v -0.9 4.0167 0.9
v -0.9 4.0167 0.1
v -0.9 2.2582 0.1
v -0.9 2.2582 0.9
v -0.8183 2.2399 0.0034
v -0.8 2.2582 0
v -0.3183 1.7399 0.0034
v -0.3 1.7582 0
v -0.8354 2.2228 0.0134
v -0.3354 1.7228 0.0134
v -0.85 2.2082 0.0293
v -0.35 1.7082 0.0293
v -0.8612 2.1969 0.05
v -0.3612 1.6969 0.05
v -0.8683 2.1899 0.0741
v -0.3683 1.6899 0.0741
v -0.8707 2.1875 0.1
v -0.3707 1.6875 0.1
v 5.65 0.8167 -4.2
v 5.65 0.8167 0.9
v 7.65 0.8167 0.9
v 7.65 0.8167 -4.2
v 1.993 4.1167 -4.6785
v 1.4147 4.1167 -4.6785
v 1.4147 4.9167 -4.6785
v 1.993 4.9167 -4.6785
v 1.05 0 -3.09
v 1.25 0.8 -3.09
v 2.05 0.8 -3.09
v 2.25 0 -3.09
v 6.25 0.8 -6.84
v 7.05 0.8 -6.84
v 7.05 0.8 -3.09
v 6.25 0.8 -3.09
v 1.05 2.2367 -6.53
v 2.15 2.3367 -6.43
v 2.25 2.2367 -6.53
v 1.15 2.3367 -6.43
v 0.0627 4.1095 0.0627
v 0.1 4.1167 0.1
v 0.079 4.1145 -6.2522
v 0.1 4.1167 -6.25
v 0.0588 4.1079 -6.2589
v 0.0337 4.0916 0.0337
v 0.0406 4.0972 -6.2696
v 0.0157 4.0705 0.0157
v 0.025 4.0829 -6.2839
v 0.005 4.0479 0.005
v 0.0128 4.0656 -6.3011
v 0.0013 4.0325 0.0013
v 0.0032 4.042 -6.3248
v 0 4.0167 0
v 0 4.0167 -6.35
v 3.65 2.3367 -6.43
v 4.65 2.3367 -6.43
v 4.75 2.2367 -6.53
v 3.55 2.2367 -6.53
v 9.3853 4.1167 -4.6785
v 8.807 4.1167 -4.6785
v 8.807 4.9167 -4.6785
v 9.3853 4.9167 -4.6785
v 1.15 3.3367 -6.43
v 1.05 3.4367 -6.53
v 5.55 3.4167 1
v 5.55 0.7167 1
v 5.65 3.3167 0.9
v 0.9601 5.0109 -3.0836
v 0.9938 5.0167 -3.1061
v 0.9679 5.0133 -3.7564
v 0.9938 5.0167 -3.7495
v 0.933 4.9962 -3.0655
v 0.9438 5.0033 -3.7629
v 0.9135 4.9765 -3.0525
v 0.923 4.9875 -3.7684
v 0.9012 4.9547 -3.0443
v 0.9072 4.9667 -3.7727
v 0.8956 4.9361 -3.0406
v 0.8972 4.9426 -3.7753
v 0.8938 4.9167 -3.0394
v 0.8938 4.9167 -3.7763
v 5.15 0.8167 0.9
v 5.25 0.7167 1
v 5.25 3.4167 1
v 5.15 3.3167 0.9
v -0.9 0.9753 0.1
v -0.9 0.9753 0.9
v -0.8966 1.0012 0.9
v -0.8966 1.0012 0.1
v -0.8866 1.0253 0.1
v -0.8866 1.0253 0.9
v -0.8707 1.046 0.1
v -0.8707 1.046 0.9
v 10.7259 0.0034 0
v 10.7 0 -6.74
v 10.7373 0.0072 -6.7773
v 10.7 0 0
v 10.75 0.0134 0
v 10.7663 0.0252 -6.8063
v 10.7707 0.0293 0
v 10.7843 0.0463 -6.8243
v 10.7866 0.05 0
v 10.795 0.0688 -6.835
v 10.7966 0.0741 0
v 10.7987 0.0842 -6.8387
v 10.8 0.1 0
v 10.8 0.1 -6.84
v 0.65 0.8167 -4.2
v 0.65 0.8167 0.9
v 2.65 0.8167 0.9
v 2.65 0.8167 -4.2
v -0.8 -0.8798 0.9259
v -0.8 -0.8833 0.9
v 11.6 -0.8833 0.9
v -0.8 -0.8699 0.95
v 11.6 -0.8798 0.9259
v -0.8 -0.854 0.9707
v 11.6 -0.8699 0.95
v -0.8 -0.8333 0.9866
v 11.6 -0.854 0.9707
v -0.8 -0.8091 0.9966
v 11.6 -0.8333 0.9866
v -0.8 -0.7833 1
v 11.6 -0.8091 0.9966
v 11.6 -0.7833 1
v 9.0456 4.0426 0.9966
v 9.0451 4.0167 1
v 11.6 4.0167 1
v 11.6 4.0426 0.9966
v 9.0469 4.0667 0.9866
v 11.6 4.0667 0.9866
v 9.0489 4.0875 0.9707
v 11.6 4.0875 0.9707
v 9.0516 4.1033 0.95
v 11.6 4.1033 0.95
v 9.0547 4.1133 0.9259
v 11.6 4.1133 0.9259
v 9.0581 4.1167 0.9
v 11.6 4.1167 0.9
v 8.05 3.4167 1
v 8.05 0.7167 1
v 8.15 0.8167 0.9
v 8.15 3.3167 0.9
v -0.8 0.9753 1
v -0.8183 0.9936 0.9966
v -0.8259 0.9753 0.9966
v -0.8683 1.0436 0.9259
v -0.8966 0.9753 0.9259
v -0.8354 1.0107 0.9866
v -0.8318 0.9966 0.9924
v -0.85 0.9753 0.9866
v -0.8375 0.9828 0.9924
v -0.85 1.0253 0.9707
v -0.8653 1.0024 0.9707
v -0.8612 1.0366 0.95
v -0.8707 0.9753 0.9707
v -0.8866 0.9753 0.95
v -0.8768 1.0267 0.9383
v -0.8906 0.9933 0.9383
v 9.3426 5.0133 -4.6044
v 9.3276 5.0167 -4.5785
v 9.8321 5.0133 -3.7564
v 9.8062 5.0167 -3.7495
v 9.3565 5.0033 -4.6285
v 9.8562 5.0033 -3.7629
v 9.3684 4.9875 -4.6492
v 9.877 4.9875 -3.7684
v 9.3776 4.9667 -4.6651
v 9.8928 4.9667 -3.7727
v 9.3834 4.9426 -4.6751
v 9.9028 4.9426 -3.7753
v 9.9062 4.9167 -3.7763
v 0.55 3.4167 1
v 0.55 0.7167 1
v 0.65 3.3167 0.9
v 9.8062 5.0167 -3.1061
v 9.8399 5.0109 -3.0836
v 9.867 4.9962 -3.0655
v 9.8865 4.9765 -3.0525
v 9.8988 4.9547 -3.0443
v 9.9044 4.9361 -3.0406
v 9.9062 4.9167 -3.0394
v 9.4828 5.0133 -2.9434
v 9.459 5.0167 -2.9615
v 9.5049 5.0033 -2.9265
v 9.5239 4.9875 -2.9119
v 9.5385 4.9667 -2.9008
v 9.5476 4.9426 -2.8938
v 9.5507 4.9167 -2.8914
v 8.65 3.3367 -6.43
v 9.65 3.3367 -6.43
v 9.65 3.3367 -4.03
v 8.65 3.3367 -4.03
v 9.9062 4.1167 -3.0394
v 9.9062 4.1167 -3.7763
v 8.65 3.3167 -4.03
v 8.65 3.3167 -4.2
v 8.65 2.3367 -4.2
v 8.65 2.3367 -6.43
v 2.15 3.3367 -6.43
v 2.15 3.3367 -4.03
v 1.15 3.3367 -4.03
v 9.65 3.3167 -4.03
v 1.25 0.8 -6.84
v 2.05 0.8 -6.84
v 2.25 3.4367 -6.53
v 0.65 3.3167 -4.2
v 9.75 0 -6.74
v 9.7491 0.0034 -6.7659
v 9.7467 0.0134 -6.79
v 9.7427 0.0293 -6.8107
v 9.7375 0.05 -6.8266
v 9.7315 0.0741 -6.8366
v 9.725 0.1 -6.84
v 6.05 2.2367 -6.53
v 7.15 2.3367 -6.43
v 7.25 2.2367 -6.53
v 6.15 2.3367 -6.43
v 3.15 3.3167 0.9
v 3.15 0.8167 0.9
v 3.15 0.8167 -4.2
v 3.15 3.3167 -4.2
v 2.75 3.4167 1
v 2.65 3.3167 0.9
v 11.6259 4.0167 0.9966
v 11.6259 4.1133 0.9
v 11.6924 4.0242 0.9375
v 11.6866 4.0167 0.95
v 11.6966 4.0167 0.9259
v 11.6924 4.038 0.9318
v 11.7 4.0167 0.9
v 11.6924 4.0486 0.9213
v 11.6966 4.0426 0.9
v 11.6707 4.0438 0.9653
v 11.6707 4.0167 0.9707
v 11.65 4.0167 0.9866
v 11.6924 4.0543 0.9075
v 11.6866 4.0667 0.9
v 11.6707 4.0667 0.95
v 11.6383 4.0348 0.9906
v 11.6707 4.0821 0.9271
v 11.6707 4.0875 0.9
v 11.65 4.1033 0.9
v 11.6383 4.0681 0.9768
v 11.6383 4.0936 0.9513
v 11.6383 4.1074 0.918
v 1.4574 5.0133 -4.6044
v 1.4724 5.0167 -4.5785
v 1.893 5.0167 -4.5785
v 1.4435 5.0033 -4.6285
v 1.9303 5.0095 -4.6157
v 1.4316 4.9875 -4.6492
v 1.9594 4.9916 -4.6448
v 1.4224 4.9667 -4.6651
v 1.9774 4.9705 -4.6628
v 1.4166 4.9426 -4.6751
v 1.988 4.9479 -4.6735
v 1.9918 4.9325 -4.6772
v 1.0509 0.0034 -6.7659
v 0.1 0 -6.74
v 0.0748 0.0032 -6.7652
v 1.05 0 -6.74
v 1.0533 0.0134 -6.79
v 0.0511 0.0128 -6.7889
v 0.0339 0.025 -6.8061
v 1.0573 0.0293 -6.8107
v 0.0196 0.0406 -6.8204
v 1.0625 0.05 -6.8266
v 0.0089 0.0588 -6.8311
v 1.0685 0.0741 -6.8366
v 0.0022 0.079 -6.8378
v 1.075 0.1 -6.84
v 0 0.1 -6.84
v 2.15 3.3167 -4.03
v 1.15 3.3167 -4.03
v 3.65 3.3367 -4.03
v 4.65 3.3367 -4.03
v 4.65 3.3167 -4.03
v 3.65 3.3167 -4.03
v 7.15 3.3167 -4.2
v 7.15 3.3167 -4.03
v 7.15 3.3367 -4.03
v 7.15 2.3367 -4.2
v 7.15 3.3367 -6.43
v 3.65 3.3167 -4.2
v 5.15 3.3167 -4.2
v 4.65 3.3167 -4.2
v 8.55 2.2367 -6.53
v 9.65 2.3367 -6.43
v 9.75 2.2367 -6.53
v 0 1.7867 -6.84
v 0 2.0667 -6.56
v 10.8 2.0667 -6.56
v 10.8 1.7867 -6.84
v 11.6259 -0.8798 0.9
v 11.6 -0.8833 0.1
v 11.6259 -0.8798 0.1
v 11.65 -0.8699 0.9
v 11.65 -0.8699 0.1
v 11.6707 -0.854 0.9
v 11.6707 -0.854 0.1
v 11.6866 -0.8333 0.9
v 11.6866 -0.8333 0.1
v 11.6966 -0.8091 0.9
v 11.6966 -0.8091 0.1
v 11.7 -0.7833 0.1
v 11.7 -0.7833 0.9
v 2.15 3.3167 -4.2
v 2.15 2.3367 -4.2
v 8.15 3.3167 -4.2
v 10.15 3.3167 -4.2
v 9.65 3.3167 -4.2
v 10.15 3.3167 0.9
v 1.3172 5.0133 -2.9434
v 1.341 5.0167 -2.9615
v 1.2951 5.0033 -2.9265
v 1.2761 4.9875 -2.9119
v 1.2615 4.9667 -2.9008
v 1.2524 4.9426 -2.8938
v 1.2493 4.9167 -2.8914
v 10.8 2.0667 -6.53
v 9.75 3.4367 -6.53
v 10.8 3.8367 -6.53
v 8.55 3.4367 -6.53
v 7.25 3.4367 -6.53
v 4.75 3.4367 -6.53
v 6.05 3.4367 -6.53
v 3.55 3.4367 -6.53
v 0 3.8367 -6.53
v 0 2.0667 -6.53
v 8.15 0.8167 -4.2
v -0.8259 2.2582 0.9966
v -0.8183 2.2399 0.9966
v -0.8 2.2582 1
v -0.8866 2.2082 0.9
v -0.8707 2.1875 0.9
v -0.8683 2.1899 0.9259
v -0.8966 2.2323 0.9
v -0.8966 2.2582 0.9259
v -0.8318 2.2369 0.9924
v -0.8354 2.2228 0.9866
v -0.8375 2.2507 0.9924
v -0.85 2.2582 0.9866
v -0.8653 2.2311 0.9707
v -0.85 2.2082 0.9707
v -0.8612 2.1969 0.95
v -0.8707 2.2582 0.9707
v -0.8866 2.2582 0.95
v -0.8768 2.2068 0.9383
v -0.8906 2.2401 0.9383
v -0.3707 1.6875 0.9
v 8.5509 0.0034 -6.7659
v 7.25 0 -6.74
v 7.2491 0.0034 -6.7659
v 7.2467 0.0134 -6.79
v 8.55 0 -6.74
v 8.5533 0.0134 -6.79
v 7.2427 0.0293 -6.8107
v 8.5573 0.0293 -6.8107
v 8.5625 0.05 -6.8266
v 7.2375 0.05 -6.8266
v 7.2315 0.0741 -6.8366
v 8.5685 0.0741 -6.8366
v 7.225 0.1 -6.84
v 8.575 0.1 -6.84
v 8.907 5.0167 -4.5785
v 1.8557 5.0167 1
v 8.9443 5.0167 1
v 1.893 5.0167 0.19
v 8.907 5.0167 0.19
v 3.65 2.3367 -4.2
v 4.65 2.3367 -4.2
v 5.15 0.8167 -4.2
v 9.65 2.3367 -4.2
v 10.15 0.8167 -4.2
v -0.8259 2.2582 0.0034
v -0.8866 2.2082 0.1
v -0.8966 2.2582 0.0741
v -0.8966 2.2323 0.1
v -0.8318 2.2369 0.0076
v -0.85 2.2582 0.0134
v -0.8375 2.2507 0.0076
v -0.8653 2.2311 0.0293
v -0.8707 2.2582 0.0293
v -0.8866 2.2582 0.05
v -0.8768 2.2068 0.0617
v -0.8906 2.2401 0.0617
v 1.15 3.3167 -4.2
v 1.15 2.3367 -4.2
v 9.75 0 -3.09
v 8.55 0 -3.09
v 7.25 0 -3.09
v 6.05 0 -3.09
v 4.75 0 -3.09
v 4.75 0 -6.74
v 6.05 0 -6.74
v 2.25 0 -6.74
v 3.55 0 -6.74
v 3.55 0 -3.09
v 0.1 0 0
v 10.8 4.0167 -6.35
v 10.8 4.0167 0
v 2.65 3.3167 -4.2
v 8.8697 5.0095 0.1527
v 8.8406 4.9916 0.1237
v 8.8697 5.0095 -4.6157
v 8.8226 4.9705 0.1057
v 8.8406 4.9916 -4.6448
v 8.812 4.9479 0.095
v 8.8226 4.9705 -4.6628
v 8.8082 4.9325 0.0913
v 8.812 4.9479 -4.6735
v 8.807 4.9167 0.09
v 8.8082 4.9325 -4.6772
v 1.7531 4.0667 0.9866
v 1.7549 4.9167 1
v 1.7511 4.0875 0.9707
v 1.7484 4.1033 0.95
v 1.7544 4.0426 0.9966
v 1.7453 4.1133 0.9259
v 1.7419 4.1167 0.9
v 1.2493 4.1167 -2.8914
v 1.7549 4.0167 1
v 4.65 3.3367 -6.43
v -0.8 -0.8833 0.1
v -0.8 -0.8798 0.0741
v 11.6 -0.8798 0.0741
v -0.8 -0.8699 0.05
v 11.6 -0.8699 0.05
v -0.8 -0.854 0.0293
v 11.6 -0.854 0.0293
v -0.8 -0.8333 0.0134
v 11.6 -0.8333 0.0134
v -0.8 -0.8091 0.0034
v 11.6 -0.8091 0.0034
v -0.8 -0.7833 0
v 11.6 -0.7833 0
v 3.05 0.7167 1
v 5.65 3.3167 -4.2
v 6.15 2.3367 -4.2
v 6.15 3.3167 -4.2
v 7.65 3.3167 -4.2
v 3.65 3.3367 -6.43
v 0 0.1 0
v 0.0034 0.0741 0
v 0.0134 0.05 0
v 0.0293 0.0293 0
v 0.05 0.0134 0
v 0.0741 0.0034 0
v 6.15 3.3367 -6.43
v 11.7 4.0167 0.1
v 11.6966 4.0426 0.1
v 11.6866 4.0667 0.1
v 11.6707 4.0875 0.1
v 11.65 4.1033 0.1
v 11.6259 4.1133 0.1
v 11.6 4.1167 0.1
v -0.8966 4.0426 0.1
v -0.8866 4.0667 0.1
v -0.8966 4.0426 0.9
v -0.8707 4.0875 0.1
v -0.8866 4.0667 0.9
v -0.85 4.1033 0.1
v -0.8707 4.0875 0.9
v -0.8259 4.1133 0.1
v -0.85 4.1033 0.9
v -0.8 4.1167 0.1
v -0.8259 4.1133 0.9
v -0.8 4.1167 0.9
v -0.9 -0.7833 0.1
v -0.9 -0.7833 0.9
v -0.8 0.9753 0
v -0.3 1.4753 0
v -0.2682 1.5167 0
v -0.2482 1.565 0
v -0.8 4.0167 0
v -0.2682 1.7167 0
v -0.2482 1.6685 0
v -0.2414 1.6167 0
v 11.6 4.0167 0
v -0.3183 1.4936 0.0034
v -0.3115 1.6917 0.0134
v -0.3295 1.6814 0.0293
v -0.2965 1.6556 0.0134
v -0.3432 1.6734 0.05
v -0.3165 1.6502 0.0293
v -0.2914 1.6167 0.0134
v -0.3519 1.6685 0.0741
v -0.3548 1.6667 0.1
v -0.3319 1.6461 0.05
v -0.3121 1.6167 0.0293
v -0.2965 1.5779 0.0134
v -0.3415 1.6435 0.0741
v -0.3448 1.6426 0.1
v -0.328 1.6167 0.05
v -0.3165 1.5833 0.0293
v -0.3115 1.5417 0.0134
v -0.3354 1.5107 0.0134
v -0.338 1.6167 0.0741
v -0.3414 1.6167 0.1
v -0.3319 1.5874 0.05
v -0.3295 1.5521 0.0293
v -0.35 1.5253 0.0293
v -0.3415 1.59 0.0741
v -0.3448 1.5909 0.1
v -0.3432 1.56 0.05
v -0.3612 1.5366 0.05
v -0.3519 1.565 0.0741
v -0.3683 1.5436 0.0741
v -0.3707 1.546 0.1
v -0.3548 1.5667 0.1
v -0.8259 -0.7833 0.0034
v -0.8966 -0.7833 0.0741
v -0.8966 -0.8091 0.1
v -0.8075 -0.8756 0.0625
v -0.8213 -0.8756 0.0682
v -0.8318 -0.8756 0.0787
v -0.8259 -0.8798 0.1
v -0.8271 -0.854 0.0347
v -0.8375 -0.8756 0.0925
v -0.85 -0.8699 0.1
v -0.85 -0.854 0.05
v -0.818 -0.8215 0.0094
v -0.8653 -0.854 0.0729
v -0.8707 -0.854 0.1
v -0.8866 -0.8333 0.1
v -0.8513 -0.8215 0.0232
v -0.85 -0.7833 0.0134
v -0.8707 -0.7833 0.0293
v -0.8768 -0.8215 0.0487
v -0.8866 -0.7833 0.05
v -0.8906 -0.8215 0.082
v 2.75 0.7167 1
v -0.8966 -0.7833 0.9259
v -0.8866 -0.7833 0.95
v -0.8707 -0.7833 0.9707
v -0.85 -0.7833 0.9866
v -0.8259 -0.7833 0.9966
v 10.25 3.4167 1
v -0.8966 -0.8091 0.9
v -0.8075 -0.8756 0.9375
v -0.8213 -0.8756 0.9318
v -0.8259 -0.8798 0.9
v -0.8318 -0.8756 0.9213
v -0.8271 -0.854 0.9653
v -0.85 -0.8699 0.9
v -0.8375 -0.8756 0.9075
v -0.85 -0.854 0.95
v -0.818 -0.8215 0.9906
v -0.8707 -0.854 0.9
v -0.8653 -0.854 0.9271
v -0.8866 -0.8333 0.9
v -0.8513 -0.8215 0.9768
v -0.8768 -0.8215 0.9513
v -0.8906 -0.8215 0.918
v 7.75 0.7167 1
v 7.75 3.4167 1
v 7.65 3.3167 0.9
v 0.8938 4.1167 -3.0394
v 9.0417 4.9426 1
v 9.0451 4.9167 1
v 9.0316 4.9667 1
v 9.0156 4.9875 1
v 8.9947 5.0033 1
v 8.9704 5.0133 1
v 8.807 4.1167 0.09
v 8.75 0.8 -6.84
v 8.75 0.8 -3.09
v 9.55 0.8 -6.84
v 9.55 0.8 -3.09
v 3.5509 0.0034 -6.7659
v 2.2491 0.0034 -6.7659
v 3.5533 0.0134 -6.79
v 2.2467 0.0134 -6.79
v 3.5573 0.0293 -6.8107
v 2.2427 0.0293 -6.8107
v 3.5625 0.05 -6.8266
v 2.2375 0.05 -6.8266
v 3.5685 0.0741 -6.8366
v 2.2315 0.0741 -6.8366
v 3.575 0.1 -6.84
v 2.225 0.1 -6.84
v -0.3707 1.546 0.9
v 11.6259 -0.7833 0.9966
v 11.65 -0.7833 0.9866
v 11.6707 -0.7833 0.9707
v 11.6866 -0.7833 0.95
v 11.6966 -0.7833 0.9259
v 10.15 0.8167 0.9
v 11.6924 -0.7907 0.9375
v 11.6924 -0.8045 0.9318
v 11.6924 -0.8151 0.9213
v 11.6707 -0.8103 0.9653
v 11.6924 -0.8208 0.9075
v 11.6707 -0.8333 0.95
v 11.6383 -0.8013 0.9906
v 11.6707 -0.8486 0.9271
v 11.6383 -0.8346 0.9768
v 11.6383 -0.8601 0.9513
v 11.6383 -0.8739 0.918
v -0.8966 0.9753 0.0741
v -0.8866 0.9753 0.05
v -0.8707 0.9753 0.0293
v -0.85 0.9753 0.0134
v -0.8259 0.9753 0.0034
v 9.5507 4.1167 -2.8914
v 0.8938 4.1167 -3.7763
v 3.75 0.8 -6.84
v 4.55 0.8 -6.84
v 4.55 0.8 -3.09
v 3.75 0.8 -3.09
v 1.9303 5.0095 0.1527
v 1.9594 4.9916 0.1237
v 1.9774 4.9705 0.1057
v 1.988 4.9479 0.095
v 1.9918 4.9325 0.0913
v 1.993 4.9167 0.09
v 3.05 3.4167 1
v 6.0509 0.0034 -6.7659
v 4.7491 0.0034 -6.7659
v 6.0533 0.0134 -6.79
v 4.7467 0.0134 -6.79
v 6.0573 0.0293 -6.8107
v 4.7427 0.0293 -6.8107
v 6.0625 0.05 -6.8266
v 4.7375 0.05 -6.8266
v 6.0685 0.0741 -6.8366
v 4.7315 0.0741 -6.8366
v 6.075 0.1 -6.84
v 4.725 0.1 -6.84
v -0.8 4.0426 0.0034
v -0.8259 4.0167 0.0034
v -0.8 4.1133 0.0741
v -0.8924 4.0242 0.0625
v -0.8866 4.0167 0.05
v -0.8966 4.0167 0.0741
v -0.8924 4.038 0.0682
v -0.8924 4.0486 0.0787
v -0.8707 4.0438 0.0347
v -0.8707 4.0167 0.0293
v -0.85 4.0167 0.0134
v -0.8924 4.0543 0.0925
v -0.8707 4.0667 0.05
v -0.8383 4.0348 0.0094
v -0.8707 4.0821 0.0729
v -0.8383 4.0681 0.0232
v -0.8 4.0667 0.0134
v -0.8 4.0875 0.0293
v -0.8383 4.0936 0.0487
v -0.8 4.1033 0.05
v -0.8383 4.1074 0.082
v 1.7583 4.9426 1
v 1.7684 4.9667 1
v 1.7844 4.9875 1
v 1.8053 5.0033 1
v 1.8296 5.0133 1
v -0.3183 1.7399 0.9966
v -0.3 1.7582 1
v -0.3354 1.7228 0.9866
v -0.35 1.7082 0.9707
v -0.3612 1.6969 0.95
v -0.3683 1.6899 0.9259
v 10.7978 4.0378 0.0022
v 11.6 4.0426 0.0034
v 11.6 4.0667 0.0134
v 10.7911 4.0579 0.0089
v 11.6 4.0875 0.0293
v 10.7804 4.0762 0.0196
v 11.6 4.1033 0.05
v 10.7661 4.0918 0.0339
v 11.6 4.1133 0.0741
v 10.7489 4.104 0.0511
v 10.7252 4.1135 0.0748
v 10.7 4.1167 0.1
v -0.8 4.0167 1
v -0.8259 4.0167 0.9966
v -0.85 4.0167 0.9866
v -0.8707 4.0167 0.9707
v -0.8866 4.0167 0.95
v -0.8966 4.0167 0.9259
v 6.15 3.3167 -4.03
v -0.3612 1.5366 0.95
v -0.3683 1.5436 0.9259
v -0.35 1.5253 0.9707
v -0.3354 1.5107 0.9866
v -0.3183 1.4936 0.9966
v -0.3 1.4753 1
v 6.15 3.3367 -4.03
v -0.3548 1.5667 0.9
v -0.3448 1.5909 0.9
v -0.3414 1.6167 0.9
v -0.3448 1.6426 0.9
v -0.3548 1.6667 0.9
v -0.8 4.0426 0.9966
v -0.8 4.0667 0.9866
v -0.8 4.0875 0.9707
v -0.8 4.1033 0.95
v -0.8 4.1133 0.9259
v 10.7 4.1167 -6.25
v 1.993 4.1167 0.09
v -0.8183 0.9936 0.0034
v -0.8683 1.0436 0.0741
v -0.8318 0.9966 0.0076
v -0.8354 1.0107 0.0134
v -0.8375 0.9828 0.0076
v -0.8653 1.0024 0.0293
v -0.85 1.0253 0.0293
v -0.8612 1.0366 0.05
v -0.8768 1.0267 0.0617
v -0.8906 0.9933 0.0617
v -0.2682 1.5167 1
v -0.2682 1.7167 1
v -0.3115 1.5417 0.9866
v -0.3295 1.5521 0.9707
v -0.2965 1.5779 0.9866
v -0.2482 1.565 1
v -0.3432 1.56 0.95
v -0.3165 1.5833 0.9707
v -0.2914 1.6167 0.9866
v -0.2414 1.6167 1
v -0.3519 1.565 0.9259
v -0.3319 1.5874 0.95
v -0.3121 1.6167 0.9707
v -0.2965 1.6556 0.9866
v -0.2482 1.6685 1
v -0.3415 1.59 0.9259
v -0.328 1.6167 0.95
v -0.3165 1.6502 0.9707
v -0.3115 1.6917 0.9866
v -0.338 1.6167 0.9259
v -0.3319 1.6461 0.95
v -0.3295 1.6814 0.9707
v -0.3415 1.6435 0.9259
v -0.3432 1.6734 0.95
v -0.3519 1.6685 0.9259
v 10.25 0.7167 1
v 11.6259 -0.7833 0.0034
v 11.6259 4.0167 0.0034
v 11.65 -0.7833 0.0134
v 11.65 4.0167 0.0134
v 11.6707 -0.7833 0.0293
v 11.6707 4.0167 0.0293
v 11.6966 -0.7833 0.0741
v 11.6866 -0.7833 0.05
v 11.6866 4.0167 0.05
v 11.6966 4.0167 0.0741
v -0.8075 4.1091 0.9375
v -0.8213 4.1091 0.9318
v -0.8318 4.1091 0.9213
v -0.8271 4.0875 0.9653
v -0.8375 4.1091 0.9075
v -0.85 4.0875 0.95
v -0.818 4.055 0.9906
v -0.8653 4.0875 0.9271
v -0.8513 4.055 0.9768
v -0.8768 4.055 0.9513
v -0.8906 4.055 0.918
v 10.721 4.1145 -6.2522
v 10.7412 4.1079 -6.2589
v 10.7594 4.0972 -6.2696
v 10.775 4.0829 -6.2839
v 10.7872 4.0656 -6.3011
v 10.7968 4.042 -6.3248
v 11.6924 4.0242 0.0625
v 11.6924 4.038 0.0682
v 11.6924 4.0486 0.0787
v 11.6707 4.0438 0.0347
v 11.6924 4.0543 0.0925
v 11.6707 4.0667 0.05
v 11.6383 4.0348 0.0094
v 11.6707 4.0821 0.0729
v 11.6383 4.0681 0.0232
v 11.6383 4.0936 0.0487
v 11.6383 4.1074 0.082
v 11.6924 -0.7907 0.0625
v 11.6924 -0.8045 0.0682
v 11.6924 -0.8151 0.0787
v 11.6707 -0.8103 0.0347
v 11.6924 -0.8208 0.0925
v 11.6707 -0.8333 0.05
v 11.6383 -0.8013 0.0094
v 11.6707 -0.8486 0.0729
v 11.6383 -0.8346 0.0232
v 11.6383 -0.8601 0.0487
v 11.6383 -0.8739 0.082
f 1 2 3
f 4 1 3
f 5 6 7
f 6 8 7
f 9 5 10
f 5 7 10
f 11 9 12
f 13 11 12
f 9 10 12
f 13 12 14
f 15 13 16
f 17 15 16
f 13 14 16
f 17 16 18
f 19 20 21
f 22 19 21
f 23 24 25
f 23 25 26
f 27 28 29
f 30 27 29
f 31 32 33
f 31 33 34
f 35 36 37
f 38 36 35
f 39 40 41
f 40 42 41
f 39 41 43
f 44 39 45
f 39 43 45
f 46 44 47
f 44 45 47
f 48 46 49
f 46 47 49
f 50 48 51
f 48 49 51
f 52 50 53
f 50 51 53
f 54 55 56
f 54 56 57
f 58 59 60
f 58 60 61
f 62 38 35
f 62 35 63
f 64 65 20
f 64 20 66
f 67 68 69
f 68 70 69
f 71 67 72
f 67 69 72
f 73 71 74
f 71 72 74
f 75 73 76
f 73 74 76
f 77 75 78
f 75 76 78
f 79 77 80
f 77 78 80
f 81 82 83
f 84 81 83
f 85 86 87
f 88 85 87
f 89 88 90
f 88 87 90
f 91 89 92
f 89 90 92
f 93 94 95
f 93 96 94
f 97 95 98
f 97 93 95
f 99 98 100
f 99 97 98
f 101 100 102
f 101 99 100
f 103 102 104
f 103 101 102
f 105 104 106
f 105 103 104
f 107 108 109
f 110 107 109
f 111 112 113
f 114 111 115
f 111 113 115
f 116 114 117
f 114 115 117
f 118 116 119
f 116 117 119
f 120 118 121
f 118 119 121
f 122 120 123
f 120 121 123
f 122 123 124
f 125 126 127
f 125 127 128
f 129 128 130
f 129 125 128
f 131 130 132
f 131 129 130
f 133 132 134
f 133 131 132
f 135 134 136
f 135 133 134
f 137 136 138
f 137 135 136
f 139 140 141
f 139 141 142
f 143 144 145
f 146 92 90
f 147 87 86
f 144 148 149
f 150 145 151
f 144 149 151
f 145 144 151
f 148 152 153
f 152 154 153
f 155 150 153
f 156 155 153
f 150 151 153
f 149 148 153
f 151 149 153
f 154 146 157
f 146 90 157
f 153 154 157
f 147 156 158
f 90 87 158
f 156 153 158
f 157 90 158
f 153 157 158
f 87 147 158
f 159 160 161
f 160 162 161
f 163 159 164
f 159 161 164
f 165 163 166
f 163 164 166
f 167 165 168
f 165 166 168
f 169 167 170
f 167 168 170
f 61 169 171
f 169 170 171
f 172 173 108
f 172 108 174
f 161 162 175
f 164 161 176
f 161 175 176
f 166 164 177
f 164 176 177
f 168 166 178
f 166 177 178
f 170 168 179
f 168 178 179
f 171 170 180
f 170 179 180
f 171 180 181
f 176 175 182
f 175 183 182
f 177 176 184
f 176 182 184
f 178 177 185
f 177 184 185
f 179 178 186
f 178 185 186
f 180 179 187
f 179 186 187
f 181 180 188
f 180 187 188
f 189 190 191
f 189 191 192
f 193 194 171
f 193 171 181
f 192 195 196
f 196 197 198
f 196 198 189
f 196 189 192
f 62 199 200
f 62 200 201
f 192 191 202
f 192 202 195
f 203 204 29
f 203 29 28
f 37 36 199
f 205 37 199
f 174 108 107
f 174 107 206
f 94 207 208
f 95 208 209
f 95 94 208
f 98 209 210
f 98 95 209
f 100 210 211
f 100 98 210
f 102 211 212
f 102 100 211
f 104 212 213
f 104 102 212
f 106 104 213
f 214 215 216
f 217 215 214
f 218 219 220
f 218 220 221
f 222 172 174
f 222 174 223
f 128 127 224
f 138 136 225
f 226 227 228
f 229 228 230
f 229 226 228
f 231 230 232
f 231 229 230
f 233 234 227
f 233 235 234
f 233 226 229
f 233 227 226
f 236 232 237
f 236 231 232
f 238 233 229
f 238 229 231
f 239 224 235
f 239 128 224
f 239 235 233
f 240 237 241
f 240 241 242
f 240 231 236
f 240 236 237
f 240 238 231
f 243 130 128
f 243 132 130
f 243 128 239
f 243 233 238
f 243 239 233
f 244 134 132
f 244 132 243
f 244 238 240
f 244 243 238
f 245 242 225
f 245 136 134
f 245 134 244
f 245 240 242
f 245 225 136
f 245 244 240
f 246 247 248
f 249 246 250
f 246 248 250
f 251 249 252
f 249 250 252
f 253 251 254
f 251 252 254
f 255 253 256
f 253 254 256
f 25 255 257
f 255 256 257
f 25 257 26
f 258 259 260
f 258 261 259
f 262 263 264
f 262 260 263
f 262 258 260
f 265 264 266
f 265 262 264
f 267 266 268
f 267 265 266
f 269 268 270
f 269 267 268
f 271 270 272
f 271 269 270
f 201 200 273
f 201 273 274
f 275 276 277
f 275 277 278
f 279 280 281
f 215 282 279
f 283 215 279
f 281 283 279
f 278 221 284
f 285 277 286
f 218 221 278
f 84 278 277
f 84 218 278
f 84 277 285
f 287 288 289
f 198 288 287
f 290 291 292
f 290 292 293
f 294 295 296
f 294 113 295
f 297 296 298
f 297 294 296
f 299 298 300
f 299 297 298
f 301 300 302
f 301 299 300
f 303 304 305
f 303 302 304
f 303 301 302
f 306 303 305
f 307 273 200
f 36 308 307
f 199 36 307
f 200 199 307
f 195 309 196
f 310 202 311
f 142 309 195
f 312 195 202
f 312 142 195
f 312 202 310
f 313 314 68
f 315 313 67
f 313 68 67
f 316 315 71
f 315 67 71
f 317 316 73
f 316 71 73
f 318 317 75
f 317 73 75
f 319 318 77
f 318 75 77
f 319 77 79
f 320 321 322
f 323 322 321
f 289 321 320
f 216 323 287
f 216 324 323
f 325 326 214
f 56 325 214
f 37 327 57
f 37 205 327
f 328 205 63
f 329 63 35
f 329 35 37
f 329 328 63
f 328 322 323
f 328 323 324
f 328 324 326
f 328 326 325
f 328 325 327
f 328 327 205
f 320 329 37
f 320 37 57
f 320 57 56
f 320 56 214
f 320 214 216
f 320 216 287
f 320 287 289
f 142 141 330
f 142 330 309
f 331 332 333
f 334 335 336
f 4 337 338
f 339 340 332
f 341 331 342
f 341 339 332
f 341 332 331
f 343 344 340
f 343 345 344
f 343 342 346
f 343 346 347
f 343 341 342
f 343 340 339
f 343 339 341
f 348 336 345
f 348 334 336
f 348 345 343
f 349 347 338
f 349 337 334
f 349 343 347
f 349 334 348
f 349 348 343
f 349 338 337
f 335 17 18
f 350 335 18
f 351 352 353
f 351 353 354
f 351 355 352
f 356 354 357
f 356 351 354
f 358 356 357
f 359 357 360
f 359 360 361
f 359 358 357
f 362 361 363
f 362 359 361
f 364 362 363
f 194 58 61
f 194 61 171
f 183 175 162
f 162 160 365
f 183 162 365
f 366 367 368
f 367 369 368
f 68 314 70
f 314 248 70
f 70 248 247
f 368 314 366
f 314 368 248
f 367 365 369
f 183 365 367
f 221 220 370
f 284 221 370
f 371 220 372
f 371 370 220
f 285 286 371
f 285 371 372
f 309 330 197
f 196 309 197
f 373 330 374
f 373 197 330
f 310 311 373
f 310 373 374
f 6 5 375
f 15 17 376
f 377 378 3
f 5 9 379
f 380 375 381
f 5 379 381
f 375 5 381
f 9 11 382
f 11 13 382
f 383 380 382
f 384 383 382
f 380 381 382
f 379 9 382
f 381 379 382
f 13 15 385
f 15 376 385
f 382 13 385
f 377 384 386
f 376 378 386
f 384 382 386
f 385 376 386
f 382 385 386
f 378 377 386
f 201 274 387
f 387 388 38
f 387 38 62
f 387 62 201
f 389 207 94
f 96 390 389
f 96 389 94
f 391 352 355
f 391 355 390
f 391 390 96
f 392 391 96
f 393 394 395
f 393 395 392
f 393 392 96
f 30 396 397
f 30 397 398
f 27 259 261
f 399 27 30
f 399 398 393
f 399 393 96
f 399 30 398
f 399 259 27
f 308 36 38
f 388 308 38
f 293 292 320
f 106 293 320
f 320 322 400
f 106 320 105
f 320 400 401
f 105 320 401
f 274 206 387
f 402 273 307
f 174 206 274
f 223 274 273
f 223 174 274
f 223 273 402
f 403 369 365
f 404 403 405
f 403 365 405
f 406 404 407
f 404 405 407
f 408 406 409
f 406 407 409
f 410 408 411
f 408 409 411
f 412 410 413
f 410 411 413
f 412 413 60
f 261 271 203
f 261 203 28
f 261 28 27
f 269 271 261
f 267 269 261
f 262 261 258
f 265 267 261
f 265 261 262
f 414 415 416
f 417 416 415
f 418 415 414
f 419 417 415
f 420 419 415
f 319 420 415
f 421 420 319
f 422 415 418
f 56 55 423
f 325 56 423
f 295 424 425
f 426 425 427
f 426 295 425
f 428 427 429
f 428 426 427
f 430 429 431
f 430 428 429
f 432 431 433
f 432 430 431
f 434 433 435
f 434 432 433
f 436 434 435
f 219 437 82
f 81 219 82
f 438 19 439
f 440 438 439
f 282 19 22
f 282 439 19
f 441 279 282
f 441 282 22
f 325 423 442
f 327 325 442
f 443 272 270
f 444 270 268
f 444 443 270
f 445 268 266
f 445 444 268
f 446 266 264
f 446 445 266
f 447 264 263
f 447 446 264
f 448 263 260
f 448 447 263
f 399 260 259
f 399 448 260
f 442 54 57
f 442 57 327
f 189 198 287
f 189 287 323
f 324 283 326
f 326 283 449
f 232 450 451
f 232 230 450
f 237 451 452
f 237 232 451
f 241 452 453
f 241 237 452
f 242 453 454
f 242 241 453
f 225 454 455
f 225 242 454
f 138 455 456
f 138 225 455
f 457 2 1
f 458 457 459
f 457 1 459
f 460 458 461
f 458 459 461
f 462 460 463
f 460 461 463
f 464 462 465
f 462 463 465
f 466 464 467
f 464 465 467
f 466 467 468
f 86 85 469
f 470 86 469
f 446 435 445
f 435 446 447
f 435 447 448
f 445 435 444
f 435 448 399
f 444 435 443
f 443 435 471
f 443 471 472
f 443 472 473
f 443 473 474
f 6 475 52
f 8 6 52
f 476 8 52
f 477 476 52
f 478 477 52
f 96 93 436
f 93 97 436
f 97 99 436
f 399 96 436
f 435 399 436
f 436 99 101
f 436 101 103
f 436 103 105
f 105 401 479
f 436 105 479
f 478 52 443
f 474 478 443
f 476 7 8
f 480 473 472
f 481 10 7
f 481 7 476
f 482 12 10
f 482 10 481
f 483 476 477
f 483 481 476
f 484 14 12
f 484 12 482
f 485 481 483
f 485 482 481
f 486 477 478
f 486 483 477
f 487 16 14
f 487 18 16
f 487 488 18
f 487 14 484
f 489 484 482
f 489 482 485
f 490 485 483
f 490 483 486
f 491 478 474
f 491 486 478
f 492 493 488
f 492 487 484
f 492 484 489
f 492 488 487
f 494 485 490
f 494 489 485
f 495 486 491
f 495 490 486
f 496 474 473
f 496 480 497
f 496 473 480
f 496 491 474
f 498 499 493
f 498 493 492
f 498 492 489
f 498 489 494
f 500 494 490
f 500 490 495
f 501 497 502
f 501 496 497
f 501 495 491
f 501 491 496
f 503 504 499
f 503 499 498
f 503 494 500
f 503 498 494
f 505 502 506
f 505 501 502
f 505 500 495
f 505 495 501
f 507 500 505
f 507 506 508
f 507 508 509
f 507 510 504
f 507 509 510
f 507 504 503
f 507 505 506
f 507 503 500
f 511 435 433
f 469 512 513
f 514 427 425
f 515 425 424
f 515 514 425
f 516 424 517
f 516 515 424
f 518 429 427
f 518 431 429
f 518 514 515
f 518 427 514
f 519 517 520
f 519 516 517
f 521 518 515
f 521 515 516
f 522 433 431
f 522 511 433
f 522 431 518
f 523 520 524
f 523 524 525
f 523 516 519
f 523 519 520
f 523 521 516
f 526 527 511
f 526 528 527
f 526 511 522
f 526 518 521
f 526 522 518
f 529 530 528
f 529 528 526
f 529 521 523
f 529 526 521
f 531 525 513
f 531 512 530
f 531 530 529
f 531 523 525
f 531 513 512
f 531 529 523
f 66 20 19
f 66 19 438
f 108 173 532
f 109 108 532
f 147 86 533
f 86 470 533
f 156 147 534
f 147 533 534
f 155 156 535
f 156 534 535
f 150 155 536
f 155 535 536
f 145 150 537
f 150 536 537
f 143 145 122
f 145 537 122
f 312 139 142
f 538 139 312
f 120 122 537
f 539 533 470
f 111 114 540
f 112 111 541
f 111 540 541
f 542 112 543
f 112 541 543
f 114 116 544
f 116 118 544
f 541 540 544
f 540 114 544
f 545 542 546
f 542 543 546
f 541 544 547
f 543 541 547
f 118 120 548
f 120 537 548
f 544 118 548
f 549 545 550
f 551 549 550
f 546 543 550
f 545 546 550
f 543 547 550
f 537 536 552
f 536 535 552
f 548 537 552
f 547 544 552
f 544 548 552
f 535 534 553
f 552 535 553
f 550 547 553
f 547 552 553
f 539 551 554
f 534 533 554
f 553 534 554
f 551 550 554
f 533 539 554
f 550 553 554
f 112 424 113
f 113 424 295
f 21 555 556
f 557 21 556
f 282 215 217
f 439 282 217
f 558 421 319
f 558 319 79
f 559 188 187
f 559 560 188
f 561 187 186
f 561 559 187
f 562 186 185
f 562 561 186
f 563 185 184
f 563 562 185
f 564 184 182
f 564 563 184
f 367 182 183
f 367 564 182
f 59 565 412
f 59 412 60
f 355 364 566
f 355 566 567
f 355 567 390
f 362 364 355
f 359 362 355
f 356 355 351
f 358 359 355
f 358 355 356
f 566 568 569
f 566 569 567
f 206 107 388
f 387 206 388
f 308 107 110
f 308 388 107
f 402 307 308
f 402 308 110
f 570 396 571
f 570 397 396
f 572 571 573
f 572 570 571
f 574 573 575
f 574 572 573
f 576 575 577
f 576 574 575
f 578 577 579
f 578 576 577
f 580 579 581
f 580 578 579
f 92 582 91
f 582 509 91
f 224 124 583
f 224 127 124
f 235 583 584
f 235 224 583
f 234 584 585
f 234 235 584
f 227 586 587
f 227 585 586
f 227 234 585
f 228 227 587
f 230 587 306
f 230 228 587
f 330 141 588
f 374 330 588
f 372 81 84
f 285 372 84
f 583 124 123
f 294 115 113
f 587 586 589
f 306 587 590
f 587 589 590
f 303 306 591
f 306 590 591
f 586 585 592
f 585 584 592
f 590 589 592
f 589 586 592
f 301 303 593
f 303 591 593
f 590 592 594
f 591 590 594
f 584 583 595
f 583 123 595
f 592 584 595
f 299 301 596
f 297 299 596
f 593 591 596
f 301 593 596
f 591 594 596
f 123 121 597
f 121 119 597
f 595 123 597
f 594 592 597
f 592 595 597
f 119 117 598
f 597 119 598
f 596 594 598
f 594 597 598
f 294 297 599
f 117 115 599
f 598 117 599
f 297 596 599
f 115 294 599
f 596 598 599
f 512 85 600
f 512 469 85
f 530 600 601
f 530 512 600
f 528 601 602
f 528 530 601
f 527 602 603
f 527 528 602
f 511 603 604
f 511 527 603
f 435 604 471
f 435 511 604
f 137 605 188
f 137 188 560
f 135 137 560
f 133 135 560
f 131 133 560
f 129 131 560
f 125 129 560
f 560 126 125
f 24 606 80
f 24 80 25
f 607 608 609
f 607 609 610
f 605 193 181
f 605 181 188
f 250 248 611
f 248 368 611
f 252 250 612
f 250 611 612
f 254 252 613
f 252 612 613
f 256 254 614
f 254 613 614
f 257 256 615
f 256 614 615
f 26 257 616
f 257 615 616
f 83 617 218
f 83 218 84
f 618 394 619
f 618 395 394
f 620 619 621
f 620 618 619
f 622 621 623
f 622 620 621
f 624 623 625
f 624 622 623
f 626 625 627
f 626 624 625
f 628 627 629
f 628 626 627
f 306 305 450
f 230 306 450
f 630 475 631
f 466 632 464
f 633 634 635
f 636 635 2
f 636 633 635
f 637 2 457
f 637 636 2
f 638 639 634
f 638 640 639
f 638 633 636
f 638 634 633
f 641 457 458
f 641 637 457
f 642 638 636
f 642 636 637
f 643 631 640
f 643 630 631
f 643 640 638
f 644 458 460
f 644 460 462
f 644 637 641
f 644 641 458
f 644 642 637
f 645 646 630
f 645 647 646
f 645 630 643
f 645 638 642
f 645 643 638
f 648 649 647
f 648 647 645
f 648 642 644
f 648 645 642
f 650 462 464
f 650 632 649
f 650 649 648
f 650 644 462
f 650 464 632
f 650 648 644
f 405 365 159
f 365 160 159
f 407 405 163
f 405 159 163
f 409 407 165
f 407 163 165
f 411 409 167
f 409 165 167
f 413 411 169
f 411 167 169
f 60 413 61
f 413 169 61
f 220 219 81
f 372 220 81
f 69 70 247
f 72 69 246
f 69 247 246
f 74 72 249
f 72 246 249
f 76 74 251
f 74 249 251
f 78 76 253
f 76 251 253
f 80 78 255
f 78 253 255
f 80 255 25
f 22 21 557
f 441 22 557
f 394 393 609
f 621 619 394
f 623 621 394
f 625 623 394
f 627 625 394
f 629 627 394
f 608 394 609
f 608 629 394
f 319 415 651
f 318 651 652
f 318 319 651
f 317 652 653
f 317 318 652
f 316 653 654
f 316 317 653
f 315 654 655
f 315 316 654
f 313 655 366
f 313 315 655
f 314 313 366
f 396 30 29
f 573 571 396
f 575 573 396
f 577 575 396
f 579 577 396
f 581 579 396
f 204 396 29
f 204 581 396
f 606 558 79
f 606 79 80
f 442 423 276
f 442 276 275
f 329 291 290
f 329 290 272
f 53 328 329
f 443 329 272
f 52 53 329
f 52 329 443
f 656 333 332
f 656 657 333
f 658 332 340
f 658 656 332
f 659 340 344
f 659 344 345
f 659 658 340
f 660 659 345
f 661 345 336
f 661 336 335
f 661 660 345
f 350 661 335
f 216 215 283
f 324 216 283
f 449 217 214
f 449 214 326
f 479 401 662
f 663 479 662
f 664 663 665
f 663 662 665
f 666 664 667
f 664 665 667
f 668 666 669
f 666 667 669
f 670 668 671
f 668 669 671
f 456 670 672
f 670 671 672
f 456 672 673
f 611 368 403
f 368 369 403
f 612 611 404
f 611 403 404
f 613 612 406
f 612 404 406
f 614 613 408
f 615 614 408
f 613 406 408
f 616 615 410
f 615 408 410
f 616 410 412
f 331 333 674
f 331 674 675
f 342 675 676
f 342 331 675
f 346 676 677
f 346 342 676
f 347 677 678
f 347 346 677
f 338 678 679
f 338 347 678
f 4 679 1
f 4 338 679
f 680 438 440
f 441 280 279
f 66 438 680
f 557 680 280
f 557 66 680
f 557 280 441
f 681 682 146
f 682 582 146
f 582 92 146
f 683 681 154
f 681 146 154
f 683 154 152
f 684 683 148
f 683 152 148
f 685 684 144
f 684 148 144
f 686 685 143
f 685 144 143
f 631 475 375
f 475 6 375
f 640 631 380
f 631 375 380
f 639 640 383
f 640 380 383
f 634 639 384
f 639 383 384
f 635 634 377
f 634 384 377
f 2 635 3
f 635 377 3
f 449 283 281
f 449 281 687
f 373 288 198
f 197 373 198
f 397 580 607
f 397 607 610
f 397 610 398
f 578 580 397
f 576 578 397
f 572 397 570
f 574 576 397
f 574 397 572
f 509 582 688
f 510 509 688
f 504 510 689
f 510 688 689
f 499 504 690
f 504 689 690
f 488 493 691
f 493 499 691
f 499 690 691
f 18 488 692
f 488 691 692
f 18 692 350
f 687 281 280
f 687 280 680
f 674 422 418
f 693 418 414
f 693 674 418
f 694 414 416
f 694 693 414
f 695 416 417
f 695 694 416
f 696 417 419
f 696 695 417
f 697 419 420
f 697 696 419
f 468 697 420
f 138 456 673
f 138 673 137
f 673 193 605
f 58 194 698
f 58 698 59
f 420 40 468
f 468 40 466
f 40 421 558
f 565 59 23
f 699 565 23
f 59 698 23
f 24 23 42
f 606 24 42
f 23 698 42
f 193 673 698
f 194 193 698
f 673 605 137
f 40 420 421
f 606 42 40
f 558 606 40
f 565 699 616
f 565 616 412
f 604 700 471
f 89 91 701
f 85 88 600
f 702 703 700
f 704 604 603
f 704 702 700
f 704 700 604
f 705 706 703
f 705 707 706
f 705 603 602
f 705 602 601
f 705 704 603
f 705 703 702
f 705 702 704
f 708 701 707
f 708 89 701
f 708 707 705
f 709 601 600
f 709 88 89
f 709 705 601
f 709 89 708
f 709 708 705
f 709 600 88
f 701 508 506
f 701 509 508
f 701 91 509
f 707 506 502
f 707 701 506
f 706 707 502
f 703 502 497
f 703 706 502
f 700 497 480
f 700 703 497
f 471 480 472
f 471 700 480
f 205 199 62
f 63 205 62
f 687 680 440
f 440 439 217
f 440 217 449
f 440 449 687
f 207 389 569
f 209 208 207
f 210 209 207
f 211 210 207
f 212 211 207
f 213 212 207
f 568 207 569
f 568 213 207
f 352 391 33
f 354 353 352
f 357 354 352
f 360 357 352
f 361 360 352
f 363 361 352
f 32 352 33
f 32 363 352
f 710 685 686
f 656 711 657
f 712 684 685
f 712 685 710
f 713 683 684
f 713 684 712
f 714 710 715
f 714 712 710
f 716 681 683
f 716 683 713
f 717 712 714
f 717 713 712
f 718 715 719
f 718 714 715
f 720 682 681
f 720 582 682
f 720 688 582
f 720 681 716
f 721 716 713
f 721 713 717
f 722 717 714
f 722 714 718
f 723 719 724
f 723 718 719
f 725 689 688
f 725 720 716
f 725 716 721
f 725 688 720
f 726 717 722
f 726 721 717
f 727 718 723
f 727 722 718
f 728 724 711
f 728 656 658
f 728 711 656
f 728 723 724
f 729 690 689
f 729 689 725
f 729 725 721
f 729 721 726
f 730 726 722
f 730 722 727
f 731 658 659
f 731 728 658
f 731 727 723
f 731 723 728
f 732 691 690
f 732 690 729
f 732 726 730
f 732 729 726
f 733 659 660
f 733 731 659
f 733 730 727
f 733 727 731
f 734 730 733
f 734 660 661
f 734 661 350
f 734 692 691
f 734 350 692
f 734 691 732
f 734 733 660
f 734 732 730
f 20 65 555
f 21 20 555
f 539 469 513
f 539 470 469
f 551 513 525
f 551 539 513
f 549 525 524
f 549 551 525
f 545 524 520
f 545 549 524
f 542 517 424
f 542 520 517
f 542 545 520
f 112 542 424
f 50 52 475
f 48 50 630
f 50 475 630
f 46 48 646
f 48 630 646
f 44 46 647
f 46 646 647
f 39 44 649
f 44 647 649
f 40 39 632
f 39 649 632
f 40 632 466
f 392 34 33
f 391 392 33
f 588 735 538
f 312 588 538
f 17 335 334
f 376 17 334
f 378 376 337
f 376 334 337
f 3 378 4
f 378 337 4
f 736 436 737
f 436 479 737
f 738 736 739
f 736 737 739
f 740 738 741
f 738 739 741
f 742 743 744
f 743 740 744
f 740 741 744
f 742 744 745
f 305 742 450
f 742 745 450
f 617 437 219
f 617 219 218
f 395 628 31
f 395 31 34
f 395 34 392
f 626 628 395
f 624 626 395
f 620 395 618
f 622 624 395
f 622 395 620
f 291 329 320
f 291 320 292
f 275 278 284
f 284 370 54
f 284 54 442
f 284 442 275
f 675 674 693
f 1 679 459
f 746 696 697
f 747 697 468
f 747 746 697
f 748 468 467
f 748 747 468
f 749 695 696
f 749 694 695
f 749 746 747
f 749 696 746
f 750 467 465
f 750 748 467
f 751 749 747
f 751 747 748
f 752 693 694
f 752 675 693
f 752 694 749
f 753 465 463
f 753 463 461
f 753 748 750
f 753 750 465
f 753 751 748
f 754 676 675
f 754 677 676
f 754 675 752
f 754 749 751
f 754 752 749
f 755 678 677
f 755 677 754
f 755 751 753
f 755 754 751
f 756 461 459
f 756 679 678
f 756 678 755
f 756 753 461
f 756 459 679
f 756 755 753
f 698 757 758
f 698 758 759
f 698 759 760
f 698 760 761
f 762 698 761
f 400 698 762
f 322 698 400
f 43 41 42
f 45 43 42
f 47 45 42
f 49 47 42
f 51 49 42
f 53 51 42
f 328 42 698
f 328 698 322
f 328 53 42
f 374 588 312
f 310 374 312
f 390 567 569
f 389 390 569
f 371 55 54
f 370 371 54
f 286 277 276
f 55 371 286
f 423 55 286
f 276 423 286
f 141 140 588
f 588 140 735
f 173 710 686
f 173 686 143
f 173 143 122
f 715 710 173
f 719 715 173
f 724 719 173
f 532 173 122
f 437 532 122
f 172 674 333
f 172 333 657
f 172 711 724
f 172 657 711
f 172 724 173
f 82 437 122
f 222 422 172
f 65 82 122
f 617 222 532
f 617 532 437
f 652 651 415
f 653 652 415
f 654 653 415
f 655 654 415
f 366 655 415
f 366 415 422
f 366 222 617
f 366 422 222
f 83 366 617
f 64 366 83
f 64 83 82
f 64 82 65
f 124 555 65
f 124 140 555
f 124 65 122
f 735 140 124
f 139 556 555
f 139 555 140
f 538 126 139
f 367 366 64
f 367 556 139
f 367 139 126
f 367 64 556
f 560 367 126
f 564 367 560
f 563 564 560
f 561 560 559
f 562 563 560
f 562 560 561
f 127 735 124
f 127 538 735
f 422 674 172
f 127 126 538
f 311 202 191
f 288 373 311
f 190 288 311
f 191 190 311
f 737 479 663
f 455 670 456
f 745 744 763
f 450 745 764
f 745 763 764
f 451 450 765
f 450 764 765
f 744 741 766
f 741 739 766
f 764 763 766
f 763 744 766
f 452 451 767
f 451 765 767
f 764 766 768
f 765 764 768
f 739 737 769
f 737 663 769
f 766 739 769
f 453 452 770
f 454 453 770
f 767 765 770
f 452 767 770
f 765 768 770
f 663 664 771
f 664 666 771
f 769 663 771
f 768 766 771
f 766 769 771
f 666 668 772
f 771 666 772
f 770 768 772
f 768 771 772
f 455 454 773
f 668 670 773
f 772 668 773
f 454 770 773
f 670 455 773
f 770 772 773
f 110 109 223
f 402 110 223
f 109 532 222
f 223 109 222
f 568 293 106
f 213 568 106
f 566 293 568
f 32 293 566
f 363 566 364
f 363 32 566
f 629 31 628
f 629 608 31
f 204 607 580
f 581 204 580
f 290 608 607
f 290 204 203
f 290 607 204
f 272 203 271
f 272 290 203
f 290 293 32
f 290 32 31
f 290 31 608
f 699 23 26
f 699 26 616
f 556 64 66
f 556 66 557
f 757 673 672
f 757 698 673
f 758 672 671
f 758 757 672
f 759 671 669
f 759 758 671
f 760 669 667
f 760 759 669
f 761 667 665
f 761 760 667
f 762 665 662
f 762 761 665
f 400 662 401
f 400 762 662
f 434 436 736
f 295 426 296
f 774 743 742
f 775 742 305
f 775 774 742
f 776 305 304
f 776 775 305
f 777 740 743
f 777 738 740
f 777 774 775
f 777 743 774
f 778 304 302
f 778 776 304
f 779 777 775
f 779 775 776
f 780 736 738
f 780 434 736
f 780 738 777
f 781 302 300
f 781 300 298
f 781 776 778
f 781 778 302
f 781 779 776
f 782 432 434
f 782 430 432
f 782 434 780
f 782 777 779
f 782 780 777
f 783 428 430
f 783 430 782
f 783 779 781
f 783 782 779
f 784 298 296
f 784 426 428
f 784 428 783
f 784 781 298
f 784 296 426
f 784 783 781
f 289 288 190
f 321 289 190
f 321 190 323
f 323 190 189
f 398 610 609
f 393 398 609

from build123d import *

# Parameters (mm, degrees)
BOSS_EXTRUDE1_DEPTH = 10.8
BOSS_EXTRUDE2_DEPTH = 1
BOSS_EXTRUDE3_DEPTH = 0.9
SKETCH5_W           = 2
SKETCH5_H           = 2.5
CUT_EXTRUDE1_DEPTH  = 5.2
CUT_EXTRUDE2_DEPTH  = 3.75
SKETCH7_W           = 1
SKETCH7_H           = 1
CUT_EXTRUDE3_DEPTH  = 2.5
FILLET1_R           = 0.1
CHAMFER1_SIZE       = 0.1


with BuildPart() as part:
    # Sketch2 → Boss-Extrude1 (new body)
    with BuildSketch(Plane(origin=(0, 0, 0), x_dir=(0, 0, -1), z_dir=(1, 0, 0))):
        Polygon((0, 4.116746825), (6.25, 4.116746825), (6.53, 3.836746825), (6.53, 2.066746825), (6.56, 2.066746825), (6.84, 1.786746825), (6.84, 0), (0, 0), align=None)
    extrude(amount=BOSS_EXTRUDE1_DEPTH)

    # Sketch3 → Boss-Extrude2 (add)
    with BuildSketch(Plane.XY):
        Polygon((-0.9, 1.016746825), (-0.9, -0.883253175), (11.7, -0.883253175), (11.7, 4.116746825), (-0.9, 4.116746825), (-0.9, 2.216746825), (-0.3, 1.616746825), align=None)
    extrude(amount=BOSS_EXTRUDE2_DEPTH)

    # Sketch4 → Boss-Extrude3 (add)
    with BuildSketch(Plane(origin=(0, 4.116746825, 0), x_dir=(1, 0, 0), z_dir=(0, 1, 0))):
        Polygon((1.249253009, 2.891399382), (0.893756458, 3.03935436), (0.893756458, 3.77625502), (1.41465396, 4.678475961), (1.993020778, 4.678475961), (1.993020778, -0.09), (8.806979222, -0.09), (8.806979222, 4.678475961), (9.38534604, 4.678475961), (9.906243542, 3.77625502), (9.906243542, 3.03935436), (9.550746991, 2.891399382), (9.045115198, -1), (1.754884802, -1), align=None)
    extrude(amount=BOSS_EXTRUDE3_DEPTH)

    # Sketch5 → Cut-Extrude1 (cut)
    with BuildSketch(Plane.XY.offset(1)):
        with Locations((1.65, 2.066746825)):
            Rectangle(SKETCH5_W, SKETCH5_H)
        with Locations((4.15, 2.066746825)):
            Rectangle(SKETCH5_W, SKETCH5_H)
        with Locations((6.65, 2.066746825)):
            Rectangle(SKETCH5_W, SKETCH5_H)
        with Locations((9.15, 2.066746825)):
            Rectangle(SKETCH5_W, SKETCH5_H)
    extrude(amount=-CUT_EXTRUDE1_DEPTH, mode=Mode.SUBTRACT)

    # Sketch6 → Cut-Extrude2 (cut)
    with BuildSketch(Plane(origin=(0, 0, -6.84), x_dir=(-1, 0, 0), z_dir=(0, 0, -1))):
        Polygon((-9.55, 0.8), (-8.75, 0.8), (-8.55, 0), (-9.75, 0), align=None)
        Polygon((-7.05, 0.8), (-6.25, 0.8), (-6.05, 0), (-7.25, 0), align=None)
        Polygon((-4.55, 0.8), (-3.75, 0.8), (-3.55, 0), (-4.75, 0), align=None)
        Polygon((-2.05, 0.8), (-1.25, 0.8), (-1.05, 0), (-2.25, 0), align=None)
    extrude(amount=-CUT_EXTRUDE2_DEPTH, mode=Mode.SUBTRACT)

    # Sketch7 → Cut-Extrude3 (cut)
    with BuildSketch(Plane(origin=(0, 0, -6.53), x_dir=(-1, 0, 0), z_dir=(0, 0, -1))):
        with Locations((-9.15, 2.836746825)):
            Rectangle(SKETCH7_W, SKETCH7_H)
        with Locations((-6.65, 2.836746825)):
            Rectangle(SKETCH7_W, SKETCH7_H)
        with Locations((-4.15, 2.836746825)):
            Rectangle(SKETCH7_W, SKETCH7_H)
        with Locations((-1.65, 2.836746825)):
            Rectangle(SKETCH7_W, SKETCH7_H)
    extrude(amount=-CUT_EXTRUDE3_DEPTH, mode=Mode.SUBTRACT)

    # Fillet1
    fillet1_edges = [part.edges().sort_by_distance(p)[0] for p in [
        (9.297931094, 5.016746825, -0.945699691),
        (9.728495267, 5.016746825, -2.965376871),
        (9.906243542, 5.016746825, -3.40780469),
        (9.645794791, 5.016746825, -4.22736549),
        (9.096162631, 5.016746825, -4.678475961),
        (8.806979222, 5.016746825, -2.29423798),
        (5.4, 5.016746825, 0.09),
        (1.993020778, 5.016746825, -2.29423798),
        (1.703837369, 5.016746825, -4.678475961),
        (1.154205209, 5.016746825, -4.22736549),
        (0.893756458, 5.016746825, -3.40780469),
        (1.071504733, 5.016746825, -2.965376871),
        (1.502068906, 5.016746825, -0.945699691),
        (-0.6, 1.916746825, 0),
        (-0.6, 1.316746825, 1),
        (0, 0, -3.42),
        (0, 4.116746825, -3.125),
        (10.8, 0, -3.42),
        (-0.45, 4.116746825, 0),
        (-0.9, 3.166746825, 0),
        (-0.6, 1.316746825, 0),
        (-0.9, 0.066746825, 0),
        (5.4, -0.883253175, 0),
        (11.25, 4.116746825, 0),
        (11.7, 1.616746825, 0),
        (10.372557599, 4.116746825, 1),
        (-0.9, 0.066746825, 1),
        (-0.6, 1.916746825, 1),
        (-0.9, 3.166746825, 1),
        (0.427442401, 4.116746825, 1),
        (5.4, -0.883253175, 1),
        (11.7, 1.616746825, 1),
        (-0.3, 1.616746825, 0.5),
        (-0.9, 1.016746825, 0.5),
        (-0.9, 2.216746825, 0.5),
        (-0.9, 4.116746825, 0.5),
        (-0.9, -0.883253175, 0.5),
        (11.7, -0.883253175, 0.5),
        (10.8, 4.116746825, -3.125),
        (11.7, 4.116746825, 0.5),
        (0.525, 0, -6.84),
        (2.9, 0, -6.84),
        (5.4, 0, -6.84),
        (7.9, 0, -6.84),
        (10.275, 0, -6.84),
    ]]
    fillet(fillet1_edges, radius=FILLET1_R)

    # Chamfer1
    chamfer1_edges = [part.edges().sort_by_distance(p)[0] for p in [
        (3.15, 2.066746825, 1),
        (4.15, 0.816746825, 1),
        (5.15, 2.066746825, 1),
        (4.15, 3.316746825, 1),
        (5.65, 2.066746825, 1),
        (6.65, 0.816746825, 1),
        (7.65, 2.066746825, 1),
        (6.65, 3.316746825, 1),
        (8.15, 2.066746825, 1),
        (9.15, 0.816746825, 1),
        (10.15, 2.066746825, 1),
        (9.15, 3.316746825, 1),
        (9.65, 2.836746825, -6.53),
        (9.15, 2.336746825, -6.53),
        (8.65, 2.836746825, -6.53),
        (9.15, 3.336746825, -6.53),
        (7.15, 2.836746825, -6.53),
        (6.65, 2.336746825, -6.53),
        (6.15, 2.836746825, -6.53),
        (6.65, 3.336746825, -6.53),
        (4.65, 2.836746825, -6.53),
        (4.15, 2.336746825, -6.53),
        (3.65, 2.836746825, -6.53),
        (4.15, 3.336746825, -6.53),
        (2.15, 2.836746825, -6.53),
        (1.65, 2.336746825, -6.53),
        (1.15, 2.836746825, -6.53),
        (1.65, 3.336746825, -6.53),
        (0.65, 2.066746825, 1),
        (1.65, 0.816746825, 1),
        (2.65, 2.066746825, 1),
        (1.65, 3.316746825, 1),
    ]]
    chamfer(chamfer1_edges, length=CHAMFER1_SIZE)


solid = part.part
